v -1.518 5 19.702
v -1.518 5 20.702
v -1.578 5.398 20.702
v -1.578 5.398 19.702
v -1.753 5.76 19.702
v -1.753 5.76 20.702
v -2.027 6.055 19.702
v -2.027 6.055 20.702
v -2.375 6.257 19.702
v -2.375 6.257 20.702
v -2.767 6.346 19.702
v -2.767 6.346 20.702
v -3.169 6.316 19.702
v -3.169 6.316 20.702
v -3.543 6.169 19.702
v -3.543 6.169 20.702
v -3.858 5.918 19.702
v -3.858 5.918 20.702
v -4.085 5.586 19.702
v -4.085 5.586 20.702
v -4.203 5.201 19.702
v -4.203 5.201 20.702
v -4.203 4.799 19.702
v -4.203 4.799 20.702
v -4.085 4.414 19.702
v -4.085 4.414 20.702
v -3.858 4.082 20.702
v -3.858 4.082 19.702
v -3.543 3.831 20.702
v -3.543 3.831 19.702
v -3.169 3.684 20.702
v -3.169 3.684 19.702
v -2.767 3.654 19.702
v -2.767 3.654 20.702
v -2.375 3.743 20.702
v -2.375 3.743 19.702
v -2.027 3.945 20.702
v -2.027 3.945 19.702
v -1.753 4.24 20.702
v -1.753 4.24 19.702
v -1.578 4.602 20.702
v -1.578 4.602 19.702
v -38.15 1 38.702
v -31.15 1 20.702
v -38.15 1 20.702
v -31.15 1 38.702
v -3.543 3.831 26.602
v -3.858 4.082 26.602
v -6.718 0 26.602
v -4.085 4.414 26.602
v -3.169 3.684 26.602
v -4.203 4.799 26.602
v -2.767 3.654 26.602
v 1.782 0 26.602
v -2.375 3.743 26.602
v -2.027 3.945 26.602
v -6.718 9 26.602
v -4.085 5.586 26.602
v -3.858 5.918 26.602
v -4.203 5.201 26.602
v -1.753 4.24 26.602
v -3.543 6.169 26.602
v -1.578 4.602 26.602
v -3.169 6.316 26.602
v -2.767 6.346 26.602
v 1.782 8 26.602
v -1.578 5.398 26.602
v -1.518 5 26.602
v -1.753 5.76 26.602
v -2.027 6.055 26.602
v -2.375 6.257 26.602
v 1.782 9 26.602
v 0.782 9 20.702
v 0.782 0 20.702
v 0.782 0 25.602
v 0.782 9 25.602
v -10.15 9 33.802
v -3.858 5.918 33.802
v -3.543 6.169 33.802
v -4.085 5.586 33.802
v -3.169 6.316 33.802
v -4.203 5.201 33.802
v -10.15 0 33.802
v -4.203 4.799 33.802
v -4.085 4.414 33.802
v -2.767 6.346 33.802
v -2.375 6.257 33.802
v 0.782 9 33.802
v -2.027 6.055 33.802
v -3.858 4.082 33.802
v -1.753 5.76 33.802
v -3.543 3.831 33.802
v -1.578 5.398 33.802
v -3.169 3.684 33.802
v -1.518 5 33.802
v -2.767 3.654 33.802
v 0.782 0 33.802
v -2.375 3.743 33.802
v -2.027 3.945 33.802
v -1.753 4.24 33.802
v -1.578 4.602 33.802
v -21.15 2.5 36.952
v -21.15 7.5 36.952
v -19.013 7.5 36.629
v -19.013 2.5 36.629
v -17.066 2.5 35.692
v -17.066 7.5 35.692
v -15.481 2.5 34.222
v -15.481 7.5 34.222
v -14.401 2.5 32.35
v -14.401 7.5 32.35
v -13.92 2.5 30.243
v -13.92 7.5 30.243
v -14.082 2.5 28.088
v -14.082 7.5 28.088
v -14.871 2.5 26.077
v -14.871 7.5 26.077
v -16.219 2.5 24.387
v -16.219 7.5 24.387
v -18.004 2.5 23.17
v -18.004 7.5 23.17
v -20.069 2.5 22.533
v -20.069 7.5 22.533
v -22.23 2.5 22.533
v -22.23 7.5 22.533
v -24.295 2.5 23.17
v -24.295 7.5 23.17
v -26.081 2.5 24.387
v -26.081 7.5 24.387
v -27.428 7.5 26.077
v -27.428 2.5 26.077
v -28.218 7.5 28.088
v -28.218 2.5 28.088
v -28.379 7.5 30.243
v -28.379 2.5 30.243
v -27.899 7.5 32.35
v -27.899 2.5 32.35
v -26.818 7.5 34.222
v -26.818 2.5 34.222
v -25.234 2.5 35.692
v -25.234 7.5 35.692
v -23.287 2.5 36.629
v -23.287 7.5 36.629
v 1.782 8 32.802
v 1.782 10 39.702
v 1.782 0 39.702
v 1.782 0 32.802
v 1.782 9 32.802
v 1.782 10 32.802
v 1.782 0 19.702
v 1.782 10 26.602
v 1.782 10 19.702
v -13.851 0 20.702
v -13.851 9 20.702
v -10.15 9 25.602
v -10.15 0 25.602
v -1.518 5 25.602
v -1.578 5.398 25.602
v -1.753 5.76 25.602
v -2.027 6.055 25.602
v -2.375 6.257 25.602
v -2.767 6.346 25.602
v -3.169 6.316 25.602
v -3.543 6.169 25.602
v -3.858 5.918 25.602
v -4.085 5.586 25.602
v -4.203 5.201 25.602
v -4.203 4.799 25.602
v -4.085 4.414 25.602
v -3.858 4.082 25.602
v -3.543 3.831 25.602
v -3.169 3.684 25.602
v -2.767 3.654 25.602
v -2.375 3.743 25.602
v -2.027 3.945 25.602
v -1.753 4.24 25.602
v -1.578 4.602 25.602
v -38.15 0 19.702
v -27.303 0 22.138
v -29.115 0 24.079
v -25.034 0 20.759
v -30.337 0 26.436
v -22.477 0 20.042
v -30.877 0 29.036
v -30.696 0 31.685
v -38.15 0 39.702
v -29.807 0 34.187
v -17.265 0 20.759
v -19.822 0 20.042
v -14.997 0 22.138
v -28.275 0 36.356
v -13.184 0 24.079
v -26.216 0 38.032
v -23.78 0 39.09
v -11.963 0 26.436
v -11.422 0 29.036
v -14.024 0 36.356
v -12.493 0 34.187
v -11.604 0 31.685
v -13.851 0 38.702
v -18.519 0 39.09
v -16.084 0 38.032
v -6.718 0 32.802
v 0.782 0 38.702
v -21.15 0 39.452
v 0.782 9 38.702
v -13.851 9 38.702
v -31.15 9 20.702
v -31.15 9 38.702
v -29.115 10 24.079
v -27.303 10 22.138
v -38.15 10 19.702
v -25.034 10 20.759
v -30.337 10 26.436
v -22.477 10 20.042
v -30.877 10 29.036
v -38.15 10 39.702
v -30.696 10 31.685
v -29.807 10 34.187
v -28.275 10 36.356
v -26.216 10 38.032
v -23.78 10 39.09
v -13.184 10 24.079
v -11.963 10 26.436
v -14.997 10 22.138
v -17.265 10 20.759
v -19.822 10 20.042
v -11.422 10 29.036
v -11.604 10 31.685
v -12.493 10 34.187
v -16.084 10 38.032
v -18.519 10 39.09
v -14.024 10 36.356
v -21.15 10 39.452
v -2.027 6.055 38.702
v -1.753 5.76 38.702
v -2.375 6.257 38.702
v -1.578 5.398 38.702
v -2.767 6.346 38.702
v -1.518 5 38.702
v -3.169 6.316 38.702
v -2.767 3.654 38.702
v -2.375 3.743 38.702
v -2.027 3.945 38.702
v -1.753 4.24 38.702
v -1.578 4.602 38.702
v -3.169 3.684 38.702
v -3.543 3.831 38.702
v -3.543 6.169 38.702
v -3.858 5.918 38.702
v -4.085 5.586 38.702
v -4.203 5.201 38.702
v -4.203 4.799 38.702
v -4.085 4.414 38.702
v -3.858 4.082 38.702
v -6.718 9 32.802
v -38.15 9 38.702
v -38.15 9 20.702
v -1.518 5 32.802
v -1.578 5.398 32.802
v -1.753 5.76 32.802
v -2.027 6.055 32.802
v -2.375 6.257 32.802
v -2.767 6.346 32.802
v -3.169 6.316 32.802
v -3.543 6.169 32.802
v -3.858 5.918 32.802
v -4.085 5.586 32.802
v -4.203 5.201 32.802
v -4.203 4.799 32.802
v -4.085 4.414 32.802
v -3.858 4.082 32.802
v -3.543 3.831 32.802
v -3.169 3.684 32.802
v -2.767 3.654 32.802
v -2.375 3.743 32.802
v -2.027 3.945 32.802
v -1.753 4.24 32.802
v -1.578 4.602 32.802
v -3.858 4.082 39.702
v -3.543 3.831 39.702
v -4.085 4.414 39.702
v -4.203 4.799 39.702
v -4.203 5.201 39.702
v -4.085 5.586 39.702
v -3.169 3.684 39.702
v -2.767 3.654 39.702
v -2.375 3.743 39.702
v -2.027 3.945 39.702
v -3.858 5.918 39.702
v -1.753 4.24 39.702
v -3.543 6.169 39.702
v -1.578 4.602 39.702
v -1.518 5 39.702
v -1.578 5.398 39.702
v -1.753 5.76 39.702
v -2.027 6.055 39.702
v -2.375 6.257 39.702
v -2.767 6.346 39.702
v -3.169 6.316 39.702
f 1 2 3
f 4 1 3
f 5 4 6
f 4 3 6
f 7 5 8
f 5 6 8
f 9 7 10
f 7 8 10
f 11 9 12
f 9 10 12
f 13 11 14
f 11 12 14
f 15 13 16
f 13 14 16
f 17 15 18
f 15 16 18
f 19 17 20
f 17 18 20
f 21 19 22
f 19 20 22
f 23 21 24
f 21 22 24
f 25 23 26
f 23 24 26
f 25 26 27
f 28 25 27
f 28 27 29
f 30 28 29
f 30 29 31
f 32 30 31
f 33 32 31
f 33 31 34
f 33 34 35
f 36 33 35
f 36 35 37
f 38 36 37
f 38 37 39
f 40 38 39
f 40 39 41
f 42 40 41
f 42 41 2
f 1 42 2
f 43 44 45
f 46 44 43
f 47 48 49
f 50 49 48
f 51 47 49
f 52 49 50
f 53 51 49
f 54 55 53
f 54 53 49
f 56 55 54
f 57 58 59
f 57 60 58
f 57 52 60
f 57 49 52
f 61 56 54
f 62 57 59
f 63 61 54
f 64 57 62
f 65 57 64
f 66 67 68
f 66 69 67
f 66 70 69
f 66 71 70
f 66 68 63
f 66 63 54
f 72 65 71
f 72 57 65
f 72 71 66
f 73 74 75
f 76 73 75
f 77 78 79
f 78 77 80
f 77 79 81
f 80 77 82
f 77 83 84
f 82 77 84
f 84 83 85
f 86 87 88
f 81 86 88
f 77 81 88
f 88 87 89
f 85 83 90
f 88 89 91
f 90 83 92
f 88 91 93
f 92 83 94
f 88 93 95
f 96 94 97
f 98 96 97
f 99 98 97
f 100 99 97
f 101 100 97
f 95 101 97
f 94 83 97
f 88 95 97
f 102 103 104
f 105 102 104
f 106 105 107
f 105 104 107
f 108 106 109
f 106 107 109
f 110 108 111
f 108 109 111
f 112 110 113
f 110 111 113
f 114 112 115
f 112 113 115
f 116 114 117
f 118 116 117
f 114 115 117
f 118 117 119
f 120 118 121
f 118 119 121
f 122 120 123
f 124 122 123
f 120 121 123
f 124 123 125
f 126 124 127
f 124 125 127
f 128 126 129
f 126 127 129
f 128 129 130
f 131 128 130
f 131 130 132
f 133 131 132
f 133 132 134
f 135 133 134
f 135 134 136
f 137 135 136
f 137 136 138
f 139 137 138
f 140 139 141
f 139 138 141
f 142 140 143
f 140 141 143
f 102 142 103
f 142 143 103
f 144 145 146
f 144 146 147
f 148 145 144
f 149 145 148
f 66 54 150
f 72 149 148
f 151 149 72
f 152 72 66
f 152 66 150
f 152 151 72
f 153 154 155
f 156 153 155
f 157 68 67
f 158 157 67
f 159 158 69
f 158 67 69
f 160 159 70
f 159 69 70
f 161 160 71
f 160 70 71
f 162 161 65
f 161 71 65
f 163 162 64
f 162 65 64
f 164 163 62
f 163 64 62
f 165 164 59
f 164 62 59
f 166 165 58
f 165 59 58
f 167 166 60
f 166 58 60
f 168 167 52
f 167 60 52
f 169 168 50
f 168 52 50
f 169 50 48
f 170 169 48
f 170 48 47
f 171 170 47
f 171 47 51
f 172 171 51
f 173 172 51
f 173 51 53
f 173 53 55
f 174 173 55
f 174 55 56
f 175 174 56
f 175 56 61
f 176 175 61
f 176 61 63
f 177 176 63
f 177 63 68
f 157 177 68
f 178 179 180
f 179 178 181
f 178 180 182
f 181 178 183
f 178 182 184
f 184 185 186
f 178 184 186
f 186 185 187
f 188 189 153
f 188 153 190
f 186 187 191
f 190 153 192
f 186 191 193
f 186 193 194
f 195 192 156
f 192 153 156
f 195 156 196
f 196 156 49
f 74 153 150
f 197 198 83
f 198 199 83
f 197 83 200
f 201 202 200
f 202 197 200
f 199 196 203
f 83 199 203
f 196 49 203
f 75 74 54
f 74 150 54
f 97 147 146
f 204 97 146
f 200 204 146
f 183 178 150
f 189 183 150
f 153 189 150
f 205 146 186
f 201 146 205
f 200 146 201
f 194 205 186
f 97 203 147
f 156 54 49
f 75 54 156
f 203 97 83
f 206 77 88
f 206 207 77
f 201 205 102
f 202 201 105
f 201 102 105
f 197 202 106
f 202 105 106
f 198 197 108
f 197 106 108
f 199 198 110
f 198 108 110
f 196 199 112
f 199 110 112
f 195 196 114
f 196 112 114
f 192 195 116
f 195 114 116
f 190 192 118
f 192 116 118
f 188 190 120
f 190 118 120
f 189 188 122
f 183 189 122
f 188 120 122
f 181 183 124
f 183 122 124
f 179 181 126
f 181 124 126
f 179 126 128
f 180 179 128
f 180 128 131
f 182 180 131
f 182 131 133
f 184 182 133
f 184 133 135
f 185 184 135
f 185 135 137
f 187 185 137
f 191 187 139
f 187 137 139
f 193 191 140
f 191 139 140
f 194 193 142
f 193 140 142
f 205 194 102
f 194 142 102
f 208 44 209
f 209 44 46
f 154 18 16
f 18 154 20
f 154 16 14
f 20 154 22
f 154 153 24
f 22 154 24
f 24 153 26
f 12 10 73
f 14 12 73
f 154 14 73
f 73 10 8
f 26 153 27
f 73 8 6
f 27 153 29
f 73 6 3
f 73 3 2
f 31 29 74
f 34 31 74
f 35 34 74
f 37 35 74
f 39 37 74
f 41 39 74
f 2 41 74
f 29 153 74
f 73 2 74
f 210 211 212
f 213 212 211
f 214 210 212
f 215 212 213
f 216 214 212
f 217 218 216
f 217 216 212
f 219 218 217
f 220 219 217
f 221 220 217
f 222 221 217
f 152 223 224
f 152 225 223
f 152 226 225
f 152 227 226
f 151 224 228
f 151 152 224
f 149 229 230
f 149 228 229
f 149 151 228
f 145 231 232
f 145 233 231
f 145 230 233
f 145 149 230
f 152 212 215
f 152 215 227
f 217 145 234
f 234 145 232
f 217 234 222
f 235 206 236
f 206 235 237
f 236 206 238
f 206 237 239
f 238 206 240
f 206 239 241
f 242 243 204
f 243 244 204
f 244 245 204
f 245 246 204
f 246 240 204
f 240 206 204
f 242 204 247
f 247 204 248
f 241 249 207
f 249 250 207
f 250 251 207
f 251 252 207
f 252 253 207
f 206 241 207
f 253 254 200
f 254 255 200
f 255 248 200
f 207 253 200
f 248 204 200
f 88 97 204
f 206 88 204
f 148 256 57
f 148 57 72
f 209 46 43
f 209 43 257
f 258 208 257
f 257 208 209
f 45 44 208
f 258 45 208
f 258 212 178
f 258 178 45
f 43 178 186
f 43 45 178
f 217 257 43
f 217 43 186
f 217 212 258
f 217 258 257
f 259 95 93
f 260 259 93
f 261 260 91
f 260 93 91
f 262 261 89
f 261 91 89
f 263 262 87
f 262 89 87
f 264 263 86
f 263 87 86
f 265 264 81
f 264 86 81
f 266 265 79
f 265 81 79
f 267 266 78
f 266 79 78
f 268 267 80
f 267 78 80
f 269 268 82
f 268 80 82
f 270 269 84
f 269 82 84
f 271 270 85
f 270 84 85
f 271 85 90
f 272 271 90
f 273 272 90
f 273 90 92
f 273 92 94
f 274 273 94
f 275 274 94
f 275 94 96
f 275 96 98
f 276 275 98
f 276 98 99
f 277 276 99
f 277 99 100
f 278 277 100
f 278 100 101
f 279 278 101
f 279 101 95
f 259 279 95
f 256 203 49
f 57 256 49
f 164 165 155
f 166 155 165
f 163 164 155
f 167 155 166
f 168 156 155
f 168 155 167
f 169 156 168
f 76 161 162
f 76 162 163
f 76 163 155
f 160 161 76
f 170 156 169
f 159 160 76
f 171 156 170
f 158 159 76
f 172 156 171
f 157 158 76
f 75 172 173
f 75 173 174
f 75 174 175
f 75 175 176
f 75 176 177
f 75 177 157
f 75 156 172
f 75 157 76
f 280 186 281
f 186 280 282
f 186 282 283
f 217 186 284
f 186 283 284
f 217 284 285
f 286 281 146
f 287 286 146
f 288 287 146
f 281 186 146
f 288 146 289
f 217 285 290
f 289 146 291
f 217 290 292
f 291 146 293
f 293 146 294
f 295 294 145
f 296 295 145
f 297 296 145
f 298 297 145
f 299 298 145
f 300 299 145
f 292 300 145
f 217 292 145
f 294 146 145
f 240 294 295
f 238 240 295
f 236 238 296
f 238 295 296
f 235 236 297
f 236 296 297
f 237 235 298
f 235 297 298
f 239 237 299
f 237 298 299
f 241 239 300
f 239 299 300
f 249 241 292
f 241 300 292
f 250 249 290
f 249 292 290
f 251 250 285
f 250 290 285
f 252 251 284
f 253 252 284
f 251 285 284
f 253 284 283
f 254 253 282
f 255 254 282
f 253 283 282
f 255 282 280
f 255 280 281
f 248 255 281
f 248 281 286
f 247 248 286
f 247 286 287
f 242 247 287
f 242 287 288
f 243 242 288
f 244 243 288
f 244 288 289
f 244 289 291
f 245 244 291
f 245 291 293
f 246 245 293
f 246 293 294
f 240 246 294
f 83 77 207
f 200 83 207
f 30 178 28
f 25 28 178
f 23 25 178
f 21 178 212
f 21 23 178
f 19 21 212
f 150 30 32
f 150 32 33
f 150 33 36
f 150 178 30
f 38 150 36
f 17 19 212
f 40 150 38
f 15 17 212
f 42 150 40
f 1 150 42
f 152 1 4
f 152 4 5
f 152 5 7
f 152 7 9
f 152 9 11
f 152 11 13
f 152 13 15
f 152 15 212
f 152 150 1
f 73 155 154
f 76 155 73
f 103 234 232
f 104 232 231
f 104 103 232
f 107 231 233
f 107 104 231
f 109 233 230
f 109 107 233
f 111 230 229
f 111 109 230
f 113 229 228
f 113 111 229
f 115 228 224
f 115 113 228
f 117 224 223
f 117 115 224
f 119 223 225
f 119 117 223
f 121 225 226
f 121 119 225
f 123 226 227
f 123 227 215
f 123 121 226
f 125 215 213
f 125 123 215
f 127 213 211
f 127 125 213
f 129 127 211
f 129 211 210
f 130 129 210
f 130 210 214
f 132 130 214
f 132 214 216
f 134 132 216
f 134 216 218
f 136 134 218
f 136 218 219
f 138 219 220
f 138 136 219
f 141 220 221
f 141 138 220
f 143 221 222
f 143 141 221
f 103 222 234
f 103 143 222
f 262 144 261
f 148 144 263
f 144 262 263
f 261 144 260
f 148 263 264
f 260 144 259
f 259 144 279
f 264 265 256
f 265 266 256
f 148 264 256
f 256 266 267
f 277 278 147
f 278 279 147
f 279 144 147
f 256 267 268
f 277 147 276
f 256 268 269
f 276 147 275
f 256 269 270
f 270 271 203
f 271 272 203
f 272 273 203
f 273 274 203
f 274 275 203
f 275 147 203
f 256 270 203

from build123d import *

# Parameters (mm, degrees)
BOSS_EXTRUDE2_DEPTH = 10
SKETCH2_R           = 7.25
CUT_EXTRUDE1_DEPTH  = 10
CHAMFER5_SIZE       = 2.5
SKETCH5_W           = 6.2
SKETCH5_H           = 2
BOSS_EXTRUDE3_DEPTH = 8.5
SKETCH6_W           = 2.931408159
SKETCH6_H           = 6.9
BOSS_EXTRUDE4_DEPTH = 10
SKETCH7_W           = 8.5
SKETCH7_H           = 6.2
CUT_EXTRUDE2_DEPTH  = 1
SKETCH8_R           = 1.35
CUT_EXTRUDE3_DEPTH  = 20
BOSS_EXTRUDE5_START = -10
BOSS_EXTRUDE5_DEPTH = 10
SKETCH12_W          = 20
SKETCH12_H          = 10
SKETCH12_W_2        = 18
SKETCH12_H_2        = 8
BOSS_EXTRUDE7_DEPTH = 12
CUT_EXTRUDE4_DEPTH  = 9
SKETCH15_W          = 20
SKETCH15_H          = 10
SKETCH15_W_2        = 18
SKETCH15_H_2        = 8
CUT_EXTRUDE5_DEPTH  = 5


with BuildPart() as part:
    # Sketch1 → Boss-Extrude2 (new body)
    with BuildSketch(Plane(origin=(0, 0, 0), x_dir=(1, 0, 0), z_dir=(0, 1, 0))):
        with BuildLine():
            Line((-1.149759624, -19.701544489), (-21.149759624, -19.701544489))
            ThreePointArc((-21.149759624, -19.701544489), (-31.149759624, -29.70154451), (-21.149759581, -39.701544489))
            Line((-21.149759581, -39.701544489), (-1.149759624, -39.701544489))
            Line((-1.149759624, -39.701544489), (-1.149759624, -32.801544489))
            Line((-1.149759624, -32.801544489), (-6.718351465, -32.801544489))
            Line((-6.718351465, -32.801544489), (-6.718351465, -26.601544489))
            Line((-6.718351465, -26.601544489), (-1.149759624, -26.601544489))
            Line((-1.149759624, -26.601544489), (-1.149759624, -19.701544489))
        make_face()
    extrude(amount=BOSS_EXTRUDE2_DEPTH)

    # Sketch2 → Cut-Extrude1 (cut)
    with BuildSketch(Plane(origin=(0, 10, 0), x_dir=(1, 0, 0), z_dir=(0, 1, 0))):
        with Locations((-21.149759624, -29.701544489)):
            Circle(SKETCH2_R)
    extrude(amount=-CUT_EXTRUDE1_DEPTH, mode=Mode.SUBTRACT)

    # Chamfer5
    chamfer5_edges = [part.edges().sort_by_distance(p)[0] for p in [
        (-28.399759624, 10, 29.701544489),
        (-28.399759624, 0, 29.701544489),
    ]]
    chamfer(chamfer5_edges, length=CHAMFER5_SIZE)

    # Sketch5 → Boss-Extrude3 (add)
    with BuildSketch(Plane(origin=(-6.718351465, 0, 0), x_dir=(0, 0, -1), z_dir=(1, 0, 0))):
        with Locations((-29.701544489, 9)):
            Rectangle(SKETCH5_W, SKETCH5_H)
    extrude(amount=BOSS_EXTRUDE3_DEPTH)

    # Sketch6 → Boss-Extrude4 (add)
    with BuildSketch(Plane(origin=(0, 10, 0), x_dir=(1, 0, 0), z_dir=(0, 1, 0))):
        with Locations((0.315944456, -23.151544489)):
            Rectangle(SKETCH6_W, SKETCH6_H)
        with Locations((0.315944456, -36.251544489)):
            Rectangle(SKETCH6_W, SKETCH6_H)
    extrude(amount=-BOSS_EXTRUDE4_DEPTH)

    # Sketch7 → Cut-Extrude2 (cut)
    with BuildSketch(Plane.XZ.offset(-8)):
        with Locations((-2.468351465, 29.701544489)):
            Rectangle(SKETCH7_W, SKETCH7_H)
    extrude(amount=-CUT_EXTRUDE2_DEPTH, mode=Mode.SUBTRACT)

    # Sketch8 → Cut-Extrude3 (cut)
    with BuildSketch(Plane.XY.offset(39.701544489)):
        with Locations((-2.868351465, 5)):
            Circle(SKETCH8_R)
    extrude(amount=-CUT_EXTRUDE3_DEPTH, mode=Mode.SUBTRACT)

    # Sketch10 → Boss-Extrude5 (add)
    with BuildSketch(Plane(origin=(0, 10, 0), x_dir=(1, 0, 0), z_dir=(0, 1, 0)).offset(BOSS_EXTRUDE5_START)):
        with BuildLine():
            ThreePointArc((-31.149759624, -29.701544489), (-28.220827436, -22.630476677), (-21.149759624, -19.701544489))
            Line((-21.149759624, -19.701544489), (-31.149759624, -19.701544489))
            Line((-31.149759624, -19.701544489), (-31.149759624, -29.701544489))
        make_face()
        with BuildLine():
            ThreePointArc((-21.149759624, -39.701544489), (-28.220827436, -36.772612301), (-31.149759624, -29.701544489))
            Line((-31.149759624, -29.701544489), (-31.149759624, -39.701544489))
            Line((-31.149759624, -39.701544489), (-21.149759624, -39.701544489))
        make_face()
    extrude(amount=BOSS_EXTRUDE5_DEPTH)

    # Sketch12 → Boss-Extrude7 (add)
    with BuildSketch(Plane.ZY.offset(31.149759624)):
        with Locations((29.701544489, 5)):
            Rectangle(SKETCH12_W, SKETCH12_H)
        with Locations((29.701544489, 5)):
            Rectangle(SKETCH12_W_2, SKETCH12_H_2, mode=Mode.SUBTRACT)
    extrude(amount=BOSS_EXTRUDE7_DEPTH)

    # Sketch13 → Cut-Extrude4 (cut)
    with BuildSketch(Plane.XZ):
        Polygon((0.781648535, 33.801544489), (0.781648535, 38.701544489), (-13.850581564, 38.701544489), (-10.149759624, 33.801544489), align=None)
        Polygon((0.781648535, 20.701544489), (0.781648535, 25.601544489), (-10.149759624, 25.601544489), (-13.850581564, 20.701544489), align=None)
    extrude(amount=-CUT_EXTRUDE4_DEPTH, mode=Mode.SUBTRACT)

    # Sketch15 → Cut-Extrude5 (cut)
    with BuildSketch(Plane.ZY.offset(43.149759624)):
        with Locations((29.701544489, 5)):
            Rectangle(SKETCH15_W, SKETCH15_H)
        with Locations((29.701544489, 5)):
            Rectangle(SKETCH15_W_2, SKETCH15_H_2, mode=Mode.SUBTRACT)
    extrude(amount=-CUT_EXTRUDE5_DEPTH, mode=Mode.SUBTRACT)


solid = part.part
